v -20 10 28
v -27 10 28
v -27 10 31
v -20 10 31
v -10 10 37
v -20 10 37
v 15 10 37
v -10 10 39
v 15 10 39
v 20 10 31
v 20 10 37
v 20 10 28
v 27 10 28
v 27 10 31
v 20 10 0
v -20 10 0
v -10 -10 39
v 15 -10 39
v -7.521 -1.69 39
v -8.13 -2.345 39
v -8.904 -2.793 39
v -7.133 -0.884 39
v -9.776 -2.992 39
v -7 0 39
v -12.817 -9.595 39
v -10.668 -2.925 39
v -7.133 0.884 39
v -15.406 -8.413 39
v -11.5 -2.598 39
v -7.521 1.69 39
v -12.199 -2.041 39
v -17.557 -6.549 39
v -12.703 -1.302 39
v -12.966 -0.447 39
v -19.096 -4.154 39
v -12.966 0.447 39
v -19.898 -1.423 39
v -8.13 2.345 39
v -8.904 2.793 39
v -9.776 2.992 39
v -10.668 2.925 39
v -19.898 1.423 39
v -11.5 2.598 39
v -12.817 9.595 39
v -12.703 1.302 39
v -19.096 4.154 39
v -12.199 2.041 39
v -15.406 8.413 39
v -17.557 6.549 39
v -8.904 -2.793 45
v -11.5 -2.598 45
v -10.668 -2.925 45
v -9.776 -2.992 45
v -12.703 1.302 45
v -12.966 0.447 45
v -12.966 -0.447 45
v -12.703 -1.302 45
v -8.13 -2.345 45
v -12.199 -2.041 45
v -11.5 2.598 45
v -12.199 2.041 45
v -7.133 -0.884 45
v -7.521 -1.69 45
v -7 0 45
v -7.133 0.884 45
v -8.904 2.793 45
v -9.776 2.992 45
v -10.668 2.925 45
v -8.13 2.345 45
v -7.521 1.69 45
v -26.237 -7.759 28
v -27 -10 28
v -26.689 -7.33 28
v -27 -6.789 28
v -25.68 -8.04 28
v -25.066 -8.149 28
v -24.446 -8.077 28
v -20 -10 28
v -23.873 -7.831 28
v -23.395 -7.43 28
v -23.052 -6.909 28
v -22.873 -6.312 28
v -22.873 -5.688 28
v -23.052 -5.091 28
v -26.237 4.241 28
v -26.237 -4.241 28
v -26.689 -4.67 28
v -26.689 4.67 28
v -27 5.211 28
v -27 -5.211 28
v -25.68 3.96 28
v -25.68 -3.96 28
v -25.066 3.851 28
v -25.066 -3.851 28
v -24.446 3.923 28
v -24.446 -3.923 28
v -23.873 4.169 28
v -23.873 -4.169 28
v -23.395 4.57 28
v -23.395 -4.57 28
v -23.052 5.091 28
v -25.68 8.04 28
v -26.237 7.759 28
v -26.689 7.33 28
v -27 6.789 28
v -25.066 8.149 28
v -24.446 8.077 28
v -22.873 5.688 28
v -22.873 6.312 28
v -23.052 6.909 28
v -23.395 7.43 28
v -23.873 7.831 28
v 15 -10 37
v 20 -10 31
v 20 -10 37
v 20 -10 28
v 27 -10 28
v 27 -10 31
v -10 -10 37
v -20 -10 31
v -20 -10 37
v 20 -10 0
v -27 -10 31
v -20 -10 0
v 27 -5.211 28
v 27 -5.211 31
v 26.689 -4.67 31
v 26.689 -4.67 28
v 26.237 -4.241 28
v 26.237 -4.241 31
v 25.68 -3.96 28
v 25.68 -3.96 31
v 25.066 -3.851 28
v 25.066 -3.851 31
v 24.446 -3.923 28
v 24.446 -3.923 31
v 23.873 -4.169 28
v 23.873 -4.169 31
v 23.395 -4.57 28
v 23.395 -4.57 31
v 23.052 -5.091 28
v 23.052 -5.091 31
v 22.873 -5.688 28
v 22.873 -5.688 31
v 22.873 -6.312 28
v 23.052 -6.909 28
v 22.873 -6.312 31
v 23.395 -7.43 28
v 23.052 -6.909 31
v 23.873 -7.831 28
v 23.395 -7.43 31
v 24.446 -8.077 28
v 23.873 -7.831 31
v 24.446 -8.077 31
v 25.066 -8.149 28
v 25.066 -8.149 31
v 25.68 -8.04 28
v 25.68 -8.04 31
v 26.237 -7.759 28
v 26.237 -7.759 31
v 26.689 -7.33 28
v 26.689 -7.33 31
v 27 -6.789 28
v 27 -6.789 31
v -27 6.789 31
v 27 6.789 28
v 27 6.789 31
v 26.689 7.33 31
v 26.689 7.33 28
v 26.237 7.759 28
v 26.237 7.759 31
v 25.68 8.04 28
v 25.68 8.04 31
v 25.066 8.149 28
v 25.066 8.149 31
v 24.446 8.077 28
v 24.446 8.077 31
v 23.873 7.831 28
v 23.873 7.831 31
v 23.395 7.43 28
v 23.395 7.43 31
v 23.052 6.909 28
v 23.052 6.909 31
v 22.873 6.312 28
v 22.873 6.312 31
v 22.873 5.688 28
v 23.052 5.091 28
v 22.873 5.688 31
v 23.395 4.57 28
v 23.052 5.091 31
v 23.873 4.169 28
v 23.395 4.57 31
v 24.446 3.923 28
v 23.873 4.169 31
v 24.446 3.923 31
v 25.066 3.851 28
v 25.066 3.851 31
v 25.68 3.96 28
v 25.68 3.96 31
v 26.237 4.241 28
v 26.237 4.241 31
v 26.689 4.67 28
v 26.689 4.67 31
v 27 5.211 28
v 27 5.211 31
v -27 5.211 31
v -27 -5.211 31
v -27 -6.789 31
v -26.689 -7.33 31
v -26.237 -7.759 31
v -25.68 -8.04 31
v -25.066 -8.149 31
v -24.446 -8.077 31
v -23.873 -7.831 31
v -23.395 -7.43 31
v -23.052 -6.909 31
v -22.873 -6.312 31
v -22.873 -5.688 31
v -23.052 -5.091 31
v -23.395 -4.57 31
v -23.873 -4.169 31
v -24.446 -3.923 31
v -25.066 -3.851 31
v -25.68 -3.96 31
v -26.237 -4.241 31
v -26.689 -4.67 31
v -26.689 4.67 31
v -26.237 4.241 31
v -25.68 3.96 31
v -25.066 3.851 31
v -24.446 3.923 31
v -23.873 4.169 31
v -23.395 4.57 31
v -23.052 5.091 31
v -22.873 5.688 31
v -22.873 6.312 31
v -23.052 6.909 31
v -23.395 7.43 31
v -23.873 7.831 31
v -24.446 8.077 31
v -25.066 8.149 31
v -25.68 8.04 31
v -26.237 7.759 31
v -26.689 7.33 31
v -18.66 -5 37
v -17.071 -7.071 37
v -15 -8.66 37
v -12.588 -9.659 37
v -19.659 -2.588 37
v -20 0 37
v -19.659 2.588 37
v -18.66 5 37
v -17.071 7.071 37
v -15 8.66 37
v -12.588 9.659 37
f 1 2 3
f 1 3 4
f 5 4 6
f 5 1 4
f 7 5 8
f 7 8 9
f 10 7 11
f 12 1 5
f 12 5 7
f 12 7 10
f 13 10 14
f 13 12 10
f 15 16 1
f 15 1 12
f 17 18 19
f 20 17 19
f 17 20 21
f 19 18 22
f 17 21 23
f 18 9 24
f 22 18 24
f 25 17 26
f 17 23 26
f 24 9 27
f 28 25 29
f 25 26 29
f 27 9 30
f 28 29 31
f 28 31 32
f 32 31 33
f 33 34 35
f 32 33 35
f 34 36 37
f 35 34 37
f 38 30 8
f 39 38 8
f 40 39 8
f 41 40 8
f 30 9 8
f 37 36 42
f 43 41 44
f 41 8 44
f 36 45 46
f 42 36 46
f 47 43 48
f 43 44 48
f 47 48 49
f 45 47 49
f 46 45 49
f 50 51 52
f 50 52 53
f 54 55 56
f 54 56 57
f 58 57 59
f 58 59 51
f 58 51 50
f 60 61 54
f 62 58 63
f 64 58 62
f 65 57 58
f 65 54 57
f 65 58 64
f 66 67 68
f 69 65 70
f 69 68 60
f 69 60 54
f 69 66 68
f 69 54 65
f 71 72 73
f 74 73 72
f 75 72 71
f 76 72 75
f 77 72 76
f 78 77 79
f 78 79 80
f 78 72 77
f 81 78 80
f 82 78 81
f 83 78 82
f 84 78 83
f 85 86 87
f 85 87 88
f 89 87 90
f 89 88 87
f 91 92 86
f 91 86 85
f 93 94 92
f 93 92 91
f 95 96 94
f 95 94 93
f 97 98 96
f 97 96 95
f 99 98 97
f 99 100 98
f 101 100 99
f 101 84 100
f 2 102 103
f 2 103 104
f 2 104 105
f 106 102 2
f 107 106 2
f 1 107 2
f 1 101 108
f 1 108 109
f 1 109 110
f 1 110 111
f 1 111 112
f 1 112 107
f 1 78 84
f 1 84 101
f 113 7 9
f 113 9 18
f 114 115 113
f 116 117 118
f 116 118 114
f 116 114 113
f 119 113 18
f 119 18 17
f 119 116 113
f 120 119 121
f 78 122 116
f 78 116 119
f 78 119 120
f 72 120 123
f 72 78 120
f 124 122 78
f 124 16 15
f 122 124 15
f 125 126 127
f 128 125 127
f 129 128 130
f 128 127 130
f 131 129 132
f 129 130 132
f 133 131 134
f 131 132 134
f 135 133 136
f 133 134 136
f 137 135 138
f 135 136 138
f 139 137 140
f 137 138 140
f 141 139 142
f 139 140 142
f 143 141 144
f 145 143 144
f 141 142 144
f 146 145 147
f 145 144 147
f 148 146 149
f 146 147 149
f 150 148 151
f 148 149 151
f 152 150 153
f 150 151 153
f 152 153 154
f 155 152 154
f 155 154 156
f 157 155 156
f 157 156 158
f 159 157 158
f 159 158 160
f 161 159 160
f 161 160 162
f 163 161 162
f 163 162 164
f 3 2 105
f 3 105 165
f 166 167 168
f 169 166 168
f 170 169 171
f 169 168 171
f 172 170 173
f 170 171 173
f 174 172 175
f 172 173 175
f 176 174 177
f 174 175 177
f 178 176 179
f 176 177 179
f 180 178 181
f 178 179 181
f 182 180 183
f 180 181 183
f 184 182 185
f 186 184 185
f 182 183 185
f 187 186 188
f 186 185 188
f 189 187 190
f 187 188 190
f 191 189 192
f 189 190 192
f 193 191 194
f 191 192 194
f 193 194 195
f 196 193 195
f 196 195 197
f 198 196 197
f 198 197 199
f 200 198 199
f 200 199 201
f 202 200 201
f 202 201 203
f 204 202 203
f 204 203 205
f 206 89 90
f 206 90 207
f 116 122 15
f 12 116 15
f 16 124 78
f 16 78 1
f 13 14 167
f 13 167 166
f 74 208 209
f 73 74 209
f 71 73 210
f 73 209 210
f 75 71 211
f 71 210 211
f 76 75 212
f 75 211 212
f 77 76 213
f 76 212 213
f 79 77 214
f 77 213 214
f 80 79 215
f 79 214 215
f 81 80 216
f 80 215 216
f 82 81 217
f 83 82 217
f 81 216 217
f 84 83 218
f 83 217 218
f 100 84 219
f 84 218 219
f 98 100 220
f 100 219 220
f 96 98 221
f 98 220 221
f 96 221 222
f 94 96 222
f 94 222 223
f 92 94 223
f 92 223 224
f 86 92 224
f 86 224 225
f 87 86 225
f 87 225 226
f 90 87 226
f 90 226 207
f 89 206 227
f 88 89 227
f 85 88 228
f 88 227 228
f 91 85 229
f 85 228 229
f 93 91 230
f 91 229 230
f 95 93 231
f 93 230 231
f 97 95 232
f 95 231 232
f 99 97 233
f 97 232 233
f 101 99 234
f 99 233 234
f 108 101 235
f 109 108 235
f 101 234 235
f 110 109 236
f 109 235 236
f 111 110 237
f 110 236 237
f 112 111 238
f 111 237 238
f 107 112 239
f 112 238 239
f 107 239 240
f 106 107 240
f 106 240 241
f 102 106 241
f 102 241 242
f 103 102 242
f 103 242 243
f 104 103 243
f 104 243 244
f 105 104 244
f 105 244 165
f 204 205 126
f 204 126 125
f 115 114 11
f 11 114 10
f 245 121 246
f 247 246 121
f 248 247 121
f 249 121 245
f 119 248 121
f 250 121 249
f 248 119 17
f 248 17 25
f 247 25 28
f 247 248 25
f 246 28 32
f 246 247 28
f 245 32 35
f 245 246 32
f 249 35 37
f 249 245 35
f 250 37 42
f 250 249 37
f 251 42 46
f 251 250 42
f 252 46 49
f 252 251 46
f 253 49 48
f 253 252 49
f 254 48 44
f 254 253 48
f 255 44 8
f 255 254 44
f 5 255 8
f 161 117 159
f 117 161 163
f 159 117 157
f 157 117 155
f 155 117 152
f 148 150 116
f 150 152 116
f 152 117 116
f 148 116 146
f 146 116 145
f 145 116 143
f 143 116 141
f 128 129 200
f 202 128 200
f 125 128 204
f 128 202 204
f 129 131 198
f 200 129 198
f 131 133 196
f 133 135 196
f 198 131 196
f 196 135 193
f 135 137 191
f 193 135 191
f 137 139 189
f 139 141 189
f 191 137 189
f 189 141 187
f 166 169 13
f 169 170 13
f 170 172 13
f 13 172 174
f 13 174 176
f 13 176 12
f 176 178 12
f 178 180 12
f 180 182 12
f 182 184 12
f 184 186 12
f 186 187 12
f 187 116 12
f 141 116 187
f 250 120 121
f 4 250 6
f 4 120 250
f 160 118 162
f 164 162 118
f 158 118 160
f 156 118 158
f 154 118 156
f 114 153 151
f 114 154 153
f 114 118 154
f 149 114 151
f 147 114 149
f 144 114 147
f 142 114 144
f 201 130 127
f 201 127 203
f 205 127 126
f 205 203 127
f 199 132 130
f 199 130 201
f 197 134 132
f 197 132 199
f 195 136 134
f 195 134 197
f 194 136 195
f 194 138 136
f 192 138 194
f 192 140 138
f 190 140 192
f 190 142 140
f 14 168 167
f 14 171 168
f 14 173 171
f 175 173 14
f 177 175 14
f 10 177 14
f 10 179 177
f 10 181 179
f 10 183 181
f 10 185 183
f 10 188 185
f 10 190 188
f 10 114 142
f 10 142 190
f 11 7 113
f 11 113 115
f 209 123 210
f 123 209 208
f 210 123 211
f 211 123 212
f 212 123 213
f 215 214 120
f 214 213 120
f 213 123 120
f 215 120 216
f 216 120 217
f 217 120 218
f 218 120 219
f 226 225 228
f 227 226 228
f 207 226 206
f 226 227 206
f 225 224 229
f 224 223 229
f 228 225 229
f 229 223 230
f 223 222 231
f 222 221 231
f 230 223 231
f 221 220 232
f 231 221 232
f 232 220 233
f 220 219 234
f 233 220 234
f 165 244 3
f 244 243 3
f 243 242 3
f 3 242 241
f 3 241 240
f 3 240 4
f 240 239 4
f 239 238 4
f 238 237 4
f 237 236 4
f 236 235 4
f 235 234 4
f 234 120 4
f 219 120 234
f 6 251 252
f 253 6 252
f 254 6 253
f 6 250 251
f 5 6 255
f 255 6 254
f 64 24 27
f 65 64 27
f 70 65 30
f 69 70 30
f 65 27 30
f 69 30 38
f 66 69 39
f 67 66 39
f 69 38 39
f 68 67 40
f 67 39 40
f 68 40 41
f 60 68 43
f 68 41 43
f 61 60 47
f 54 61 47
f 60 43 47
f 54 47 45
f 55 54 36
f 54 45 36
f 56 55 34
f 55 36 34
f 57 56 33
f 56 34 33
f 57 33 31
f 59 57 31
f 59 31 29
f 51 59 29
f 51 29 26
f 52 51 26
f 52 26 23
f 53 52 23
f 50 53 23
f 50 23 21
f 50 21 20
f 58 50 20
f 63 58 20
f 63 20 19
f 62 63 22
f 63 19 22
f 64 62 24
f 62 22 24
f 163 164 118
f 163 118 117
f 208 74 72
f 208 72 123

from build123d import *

# Parameters (mm, degrees)
SKETCH1_W           = 40
SKETCH1_H           = 20
BOSS_EXTRUDE1_DEPTH = 37
BOSS_EXTRUDE2_DEPTH = 2
SKETCH3_W           = 3
SKETCH3_H           = 20
BOSS_EXTRUDE3_DEPTH = 7
SKETCH4_W           = 3
SKETCH4_H           = 20
BOSS_EXTRUDE4_DEPTH = 7
SKETCH8_R           = 2.15
CUT_EXTRUDE9_DEPTH  = 7
CUT_EXTRUDE10_REACH = 44.308
SKETCH9_R           = 2.15
CUT_EXTRUDE11_REACH = 44.308
SKETCH10_R          = 2.15
SKETCH11_R          = 3
BOSS_EXTRUDE5_DEPTH = 6


with BuildPart() as part:
    # Sketch1 → Boss-Extrude1 (new body)
    with BuildSketch(Plane.XY):
        Rectangle(SKETCH1_W, SKETCH1_H)
    extrude(amount=BOSS_EXTRUDE1_DEPTH)

    # Sketch2 → Boss-Extrude2 (add)
    with BuildSketch(Plane.XY.offset(37)):
        with BuildLine():
            Line((15, 10), (15, -10))
            Line((15, -10), (-10, -10))
            ThreePointArc((-10, -10), (-20, 0), (-10, 10))
            Line((-10, 10), (15, 10))
        make_face()
    extrude(amount=BOSS_EXTRUDE2_DEPTH)

    # Sketch3 → Boss-Extrude3 (add)
    with BuildSketch(Plane(origin=(20, 0, 0), x_dir=(0, 0, -1), z_dir=(1, 0, 0))):
        with Locations((-29.5, 0)):
            Rectangle(SKETCH3_W, SKETCH3_H)
    extrude(amount=BOSS_EXTRUDE3_DEPTH)

    # Sketch4 → Boss-Extrude4 (add)
    with BuildSketch(Plane.ZY.offset(20)):
        with Locations((29.5, 0)):
            Rectangle(SKETCH4_W, SKETCH4_H)
    extrude(amount=BOSS_EXTRUDE4_DEPTH)

    # Sketch8 → Cut-Extrude9 (cut)
    with BuildSketch(Plane.XY.offset(31)):
        with Locations((-25, 6)):
            Circle(SKETCH8_R)
    extrude(amount=-CUT_EXTRUDE9_DEPTH, mode=Mode.SUBTRACT)

    # Sketch9 → Cut-Extrude10 (cut, up to next)
    with BuildSketch(Plane.XY.offset(31), mode=Mode.PRIVATE) as cut_extrude10_sk1:
        with Locations((-25, -6)):
            Circle(SKETCH9_R)
    cut_extrude10_tool1 = extrude(cut_extrude10_sk1.sketch, amount=-CUT_EXTRUDE10_REACH, mode=Mode.PRIVATE) & part.part
    add(cut_extrude10_tool1.solids().sort_by_distance((-25, -6, 31))[0], mode=Mode.SUBTRACT)

    # Sketch10 → Cut-Extrude11 (cut, up to next)
    with BuildSketch(Plane.XY.offset(31), mode=Mode.PRIVATE) as cut_extrude11_sk1:
        with Locations((25, 6)):
            Circle(SKETCH10_R)
    cut_extrude11_tool1 = extrude(cut_extrude11_sk1.sketch, amount=-CUT_EXTRUDE11_REACH, mode=Mode.PRIVATE) & part.part
    # Sketch10 → Cut-Extrude11 (cut, up to next)
    with BuildSketch(Plane.XY.offset(31), mode=Mode.PRIVATE) as cut_extrude11_sk2:
        with Locations((25, -6)):
            Circle(SKETCH10_R)
    cut_extrude11_tool2 = extrude(cut_extrude11_sk2.sketch, amount=-CUT_EXTRUDE11_REACH, mode=Mode.PRIVATE) & part.part
    add(cut_extrude11_tool1.solids().sort_by_distance((25, 6, 31))[0], mode=Mode.SUBTRACT)
    add(cut_extrude11_tool2.solids().sort_by_distance((25, -6, 31))[0], mode=Mode.SUBTRACT)

    # Sketch11 → Boss-Extrude5 (add)
    with BuildSketch(Plane.XY.offset(39)):
        with Locations((-10, 0)):
            Circle(SKETCH11_R)
    extrude(amount=BOSS_EXTRUDE5_DEPTH)


solid = part.part
